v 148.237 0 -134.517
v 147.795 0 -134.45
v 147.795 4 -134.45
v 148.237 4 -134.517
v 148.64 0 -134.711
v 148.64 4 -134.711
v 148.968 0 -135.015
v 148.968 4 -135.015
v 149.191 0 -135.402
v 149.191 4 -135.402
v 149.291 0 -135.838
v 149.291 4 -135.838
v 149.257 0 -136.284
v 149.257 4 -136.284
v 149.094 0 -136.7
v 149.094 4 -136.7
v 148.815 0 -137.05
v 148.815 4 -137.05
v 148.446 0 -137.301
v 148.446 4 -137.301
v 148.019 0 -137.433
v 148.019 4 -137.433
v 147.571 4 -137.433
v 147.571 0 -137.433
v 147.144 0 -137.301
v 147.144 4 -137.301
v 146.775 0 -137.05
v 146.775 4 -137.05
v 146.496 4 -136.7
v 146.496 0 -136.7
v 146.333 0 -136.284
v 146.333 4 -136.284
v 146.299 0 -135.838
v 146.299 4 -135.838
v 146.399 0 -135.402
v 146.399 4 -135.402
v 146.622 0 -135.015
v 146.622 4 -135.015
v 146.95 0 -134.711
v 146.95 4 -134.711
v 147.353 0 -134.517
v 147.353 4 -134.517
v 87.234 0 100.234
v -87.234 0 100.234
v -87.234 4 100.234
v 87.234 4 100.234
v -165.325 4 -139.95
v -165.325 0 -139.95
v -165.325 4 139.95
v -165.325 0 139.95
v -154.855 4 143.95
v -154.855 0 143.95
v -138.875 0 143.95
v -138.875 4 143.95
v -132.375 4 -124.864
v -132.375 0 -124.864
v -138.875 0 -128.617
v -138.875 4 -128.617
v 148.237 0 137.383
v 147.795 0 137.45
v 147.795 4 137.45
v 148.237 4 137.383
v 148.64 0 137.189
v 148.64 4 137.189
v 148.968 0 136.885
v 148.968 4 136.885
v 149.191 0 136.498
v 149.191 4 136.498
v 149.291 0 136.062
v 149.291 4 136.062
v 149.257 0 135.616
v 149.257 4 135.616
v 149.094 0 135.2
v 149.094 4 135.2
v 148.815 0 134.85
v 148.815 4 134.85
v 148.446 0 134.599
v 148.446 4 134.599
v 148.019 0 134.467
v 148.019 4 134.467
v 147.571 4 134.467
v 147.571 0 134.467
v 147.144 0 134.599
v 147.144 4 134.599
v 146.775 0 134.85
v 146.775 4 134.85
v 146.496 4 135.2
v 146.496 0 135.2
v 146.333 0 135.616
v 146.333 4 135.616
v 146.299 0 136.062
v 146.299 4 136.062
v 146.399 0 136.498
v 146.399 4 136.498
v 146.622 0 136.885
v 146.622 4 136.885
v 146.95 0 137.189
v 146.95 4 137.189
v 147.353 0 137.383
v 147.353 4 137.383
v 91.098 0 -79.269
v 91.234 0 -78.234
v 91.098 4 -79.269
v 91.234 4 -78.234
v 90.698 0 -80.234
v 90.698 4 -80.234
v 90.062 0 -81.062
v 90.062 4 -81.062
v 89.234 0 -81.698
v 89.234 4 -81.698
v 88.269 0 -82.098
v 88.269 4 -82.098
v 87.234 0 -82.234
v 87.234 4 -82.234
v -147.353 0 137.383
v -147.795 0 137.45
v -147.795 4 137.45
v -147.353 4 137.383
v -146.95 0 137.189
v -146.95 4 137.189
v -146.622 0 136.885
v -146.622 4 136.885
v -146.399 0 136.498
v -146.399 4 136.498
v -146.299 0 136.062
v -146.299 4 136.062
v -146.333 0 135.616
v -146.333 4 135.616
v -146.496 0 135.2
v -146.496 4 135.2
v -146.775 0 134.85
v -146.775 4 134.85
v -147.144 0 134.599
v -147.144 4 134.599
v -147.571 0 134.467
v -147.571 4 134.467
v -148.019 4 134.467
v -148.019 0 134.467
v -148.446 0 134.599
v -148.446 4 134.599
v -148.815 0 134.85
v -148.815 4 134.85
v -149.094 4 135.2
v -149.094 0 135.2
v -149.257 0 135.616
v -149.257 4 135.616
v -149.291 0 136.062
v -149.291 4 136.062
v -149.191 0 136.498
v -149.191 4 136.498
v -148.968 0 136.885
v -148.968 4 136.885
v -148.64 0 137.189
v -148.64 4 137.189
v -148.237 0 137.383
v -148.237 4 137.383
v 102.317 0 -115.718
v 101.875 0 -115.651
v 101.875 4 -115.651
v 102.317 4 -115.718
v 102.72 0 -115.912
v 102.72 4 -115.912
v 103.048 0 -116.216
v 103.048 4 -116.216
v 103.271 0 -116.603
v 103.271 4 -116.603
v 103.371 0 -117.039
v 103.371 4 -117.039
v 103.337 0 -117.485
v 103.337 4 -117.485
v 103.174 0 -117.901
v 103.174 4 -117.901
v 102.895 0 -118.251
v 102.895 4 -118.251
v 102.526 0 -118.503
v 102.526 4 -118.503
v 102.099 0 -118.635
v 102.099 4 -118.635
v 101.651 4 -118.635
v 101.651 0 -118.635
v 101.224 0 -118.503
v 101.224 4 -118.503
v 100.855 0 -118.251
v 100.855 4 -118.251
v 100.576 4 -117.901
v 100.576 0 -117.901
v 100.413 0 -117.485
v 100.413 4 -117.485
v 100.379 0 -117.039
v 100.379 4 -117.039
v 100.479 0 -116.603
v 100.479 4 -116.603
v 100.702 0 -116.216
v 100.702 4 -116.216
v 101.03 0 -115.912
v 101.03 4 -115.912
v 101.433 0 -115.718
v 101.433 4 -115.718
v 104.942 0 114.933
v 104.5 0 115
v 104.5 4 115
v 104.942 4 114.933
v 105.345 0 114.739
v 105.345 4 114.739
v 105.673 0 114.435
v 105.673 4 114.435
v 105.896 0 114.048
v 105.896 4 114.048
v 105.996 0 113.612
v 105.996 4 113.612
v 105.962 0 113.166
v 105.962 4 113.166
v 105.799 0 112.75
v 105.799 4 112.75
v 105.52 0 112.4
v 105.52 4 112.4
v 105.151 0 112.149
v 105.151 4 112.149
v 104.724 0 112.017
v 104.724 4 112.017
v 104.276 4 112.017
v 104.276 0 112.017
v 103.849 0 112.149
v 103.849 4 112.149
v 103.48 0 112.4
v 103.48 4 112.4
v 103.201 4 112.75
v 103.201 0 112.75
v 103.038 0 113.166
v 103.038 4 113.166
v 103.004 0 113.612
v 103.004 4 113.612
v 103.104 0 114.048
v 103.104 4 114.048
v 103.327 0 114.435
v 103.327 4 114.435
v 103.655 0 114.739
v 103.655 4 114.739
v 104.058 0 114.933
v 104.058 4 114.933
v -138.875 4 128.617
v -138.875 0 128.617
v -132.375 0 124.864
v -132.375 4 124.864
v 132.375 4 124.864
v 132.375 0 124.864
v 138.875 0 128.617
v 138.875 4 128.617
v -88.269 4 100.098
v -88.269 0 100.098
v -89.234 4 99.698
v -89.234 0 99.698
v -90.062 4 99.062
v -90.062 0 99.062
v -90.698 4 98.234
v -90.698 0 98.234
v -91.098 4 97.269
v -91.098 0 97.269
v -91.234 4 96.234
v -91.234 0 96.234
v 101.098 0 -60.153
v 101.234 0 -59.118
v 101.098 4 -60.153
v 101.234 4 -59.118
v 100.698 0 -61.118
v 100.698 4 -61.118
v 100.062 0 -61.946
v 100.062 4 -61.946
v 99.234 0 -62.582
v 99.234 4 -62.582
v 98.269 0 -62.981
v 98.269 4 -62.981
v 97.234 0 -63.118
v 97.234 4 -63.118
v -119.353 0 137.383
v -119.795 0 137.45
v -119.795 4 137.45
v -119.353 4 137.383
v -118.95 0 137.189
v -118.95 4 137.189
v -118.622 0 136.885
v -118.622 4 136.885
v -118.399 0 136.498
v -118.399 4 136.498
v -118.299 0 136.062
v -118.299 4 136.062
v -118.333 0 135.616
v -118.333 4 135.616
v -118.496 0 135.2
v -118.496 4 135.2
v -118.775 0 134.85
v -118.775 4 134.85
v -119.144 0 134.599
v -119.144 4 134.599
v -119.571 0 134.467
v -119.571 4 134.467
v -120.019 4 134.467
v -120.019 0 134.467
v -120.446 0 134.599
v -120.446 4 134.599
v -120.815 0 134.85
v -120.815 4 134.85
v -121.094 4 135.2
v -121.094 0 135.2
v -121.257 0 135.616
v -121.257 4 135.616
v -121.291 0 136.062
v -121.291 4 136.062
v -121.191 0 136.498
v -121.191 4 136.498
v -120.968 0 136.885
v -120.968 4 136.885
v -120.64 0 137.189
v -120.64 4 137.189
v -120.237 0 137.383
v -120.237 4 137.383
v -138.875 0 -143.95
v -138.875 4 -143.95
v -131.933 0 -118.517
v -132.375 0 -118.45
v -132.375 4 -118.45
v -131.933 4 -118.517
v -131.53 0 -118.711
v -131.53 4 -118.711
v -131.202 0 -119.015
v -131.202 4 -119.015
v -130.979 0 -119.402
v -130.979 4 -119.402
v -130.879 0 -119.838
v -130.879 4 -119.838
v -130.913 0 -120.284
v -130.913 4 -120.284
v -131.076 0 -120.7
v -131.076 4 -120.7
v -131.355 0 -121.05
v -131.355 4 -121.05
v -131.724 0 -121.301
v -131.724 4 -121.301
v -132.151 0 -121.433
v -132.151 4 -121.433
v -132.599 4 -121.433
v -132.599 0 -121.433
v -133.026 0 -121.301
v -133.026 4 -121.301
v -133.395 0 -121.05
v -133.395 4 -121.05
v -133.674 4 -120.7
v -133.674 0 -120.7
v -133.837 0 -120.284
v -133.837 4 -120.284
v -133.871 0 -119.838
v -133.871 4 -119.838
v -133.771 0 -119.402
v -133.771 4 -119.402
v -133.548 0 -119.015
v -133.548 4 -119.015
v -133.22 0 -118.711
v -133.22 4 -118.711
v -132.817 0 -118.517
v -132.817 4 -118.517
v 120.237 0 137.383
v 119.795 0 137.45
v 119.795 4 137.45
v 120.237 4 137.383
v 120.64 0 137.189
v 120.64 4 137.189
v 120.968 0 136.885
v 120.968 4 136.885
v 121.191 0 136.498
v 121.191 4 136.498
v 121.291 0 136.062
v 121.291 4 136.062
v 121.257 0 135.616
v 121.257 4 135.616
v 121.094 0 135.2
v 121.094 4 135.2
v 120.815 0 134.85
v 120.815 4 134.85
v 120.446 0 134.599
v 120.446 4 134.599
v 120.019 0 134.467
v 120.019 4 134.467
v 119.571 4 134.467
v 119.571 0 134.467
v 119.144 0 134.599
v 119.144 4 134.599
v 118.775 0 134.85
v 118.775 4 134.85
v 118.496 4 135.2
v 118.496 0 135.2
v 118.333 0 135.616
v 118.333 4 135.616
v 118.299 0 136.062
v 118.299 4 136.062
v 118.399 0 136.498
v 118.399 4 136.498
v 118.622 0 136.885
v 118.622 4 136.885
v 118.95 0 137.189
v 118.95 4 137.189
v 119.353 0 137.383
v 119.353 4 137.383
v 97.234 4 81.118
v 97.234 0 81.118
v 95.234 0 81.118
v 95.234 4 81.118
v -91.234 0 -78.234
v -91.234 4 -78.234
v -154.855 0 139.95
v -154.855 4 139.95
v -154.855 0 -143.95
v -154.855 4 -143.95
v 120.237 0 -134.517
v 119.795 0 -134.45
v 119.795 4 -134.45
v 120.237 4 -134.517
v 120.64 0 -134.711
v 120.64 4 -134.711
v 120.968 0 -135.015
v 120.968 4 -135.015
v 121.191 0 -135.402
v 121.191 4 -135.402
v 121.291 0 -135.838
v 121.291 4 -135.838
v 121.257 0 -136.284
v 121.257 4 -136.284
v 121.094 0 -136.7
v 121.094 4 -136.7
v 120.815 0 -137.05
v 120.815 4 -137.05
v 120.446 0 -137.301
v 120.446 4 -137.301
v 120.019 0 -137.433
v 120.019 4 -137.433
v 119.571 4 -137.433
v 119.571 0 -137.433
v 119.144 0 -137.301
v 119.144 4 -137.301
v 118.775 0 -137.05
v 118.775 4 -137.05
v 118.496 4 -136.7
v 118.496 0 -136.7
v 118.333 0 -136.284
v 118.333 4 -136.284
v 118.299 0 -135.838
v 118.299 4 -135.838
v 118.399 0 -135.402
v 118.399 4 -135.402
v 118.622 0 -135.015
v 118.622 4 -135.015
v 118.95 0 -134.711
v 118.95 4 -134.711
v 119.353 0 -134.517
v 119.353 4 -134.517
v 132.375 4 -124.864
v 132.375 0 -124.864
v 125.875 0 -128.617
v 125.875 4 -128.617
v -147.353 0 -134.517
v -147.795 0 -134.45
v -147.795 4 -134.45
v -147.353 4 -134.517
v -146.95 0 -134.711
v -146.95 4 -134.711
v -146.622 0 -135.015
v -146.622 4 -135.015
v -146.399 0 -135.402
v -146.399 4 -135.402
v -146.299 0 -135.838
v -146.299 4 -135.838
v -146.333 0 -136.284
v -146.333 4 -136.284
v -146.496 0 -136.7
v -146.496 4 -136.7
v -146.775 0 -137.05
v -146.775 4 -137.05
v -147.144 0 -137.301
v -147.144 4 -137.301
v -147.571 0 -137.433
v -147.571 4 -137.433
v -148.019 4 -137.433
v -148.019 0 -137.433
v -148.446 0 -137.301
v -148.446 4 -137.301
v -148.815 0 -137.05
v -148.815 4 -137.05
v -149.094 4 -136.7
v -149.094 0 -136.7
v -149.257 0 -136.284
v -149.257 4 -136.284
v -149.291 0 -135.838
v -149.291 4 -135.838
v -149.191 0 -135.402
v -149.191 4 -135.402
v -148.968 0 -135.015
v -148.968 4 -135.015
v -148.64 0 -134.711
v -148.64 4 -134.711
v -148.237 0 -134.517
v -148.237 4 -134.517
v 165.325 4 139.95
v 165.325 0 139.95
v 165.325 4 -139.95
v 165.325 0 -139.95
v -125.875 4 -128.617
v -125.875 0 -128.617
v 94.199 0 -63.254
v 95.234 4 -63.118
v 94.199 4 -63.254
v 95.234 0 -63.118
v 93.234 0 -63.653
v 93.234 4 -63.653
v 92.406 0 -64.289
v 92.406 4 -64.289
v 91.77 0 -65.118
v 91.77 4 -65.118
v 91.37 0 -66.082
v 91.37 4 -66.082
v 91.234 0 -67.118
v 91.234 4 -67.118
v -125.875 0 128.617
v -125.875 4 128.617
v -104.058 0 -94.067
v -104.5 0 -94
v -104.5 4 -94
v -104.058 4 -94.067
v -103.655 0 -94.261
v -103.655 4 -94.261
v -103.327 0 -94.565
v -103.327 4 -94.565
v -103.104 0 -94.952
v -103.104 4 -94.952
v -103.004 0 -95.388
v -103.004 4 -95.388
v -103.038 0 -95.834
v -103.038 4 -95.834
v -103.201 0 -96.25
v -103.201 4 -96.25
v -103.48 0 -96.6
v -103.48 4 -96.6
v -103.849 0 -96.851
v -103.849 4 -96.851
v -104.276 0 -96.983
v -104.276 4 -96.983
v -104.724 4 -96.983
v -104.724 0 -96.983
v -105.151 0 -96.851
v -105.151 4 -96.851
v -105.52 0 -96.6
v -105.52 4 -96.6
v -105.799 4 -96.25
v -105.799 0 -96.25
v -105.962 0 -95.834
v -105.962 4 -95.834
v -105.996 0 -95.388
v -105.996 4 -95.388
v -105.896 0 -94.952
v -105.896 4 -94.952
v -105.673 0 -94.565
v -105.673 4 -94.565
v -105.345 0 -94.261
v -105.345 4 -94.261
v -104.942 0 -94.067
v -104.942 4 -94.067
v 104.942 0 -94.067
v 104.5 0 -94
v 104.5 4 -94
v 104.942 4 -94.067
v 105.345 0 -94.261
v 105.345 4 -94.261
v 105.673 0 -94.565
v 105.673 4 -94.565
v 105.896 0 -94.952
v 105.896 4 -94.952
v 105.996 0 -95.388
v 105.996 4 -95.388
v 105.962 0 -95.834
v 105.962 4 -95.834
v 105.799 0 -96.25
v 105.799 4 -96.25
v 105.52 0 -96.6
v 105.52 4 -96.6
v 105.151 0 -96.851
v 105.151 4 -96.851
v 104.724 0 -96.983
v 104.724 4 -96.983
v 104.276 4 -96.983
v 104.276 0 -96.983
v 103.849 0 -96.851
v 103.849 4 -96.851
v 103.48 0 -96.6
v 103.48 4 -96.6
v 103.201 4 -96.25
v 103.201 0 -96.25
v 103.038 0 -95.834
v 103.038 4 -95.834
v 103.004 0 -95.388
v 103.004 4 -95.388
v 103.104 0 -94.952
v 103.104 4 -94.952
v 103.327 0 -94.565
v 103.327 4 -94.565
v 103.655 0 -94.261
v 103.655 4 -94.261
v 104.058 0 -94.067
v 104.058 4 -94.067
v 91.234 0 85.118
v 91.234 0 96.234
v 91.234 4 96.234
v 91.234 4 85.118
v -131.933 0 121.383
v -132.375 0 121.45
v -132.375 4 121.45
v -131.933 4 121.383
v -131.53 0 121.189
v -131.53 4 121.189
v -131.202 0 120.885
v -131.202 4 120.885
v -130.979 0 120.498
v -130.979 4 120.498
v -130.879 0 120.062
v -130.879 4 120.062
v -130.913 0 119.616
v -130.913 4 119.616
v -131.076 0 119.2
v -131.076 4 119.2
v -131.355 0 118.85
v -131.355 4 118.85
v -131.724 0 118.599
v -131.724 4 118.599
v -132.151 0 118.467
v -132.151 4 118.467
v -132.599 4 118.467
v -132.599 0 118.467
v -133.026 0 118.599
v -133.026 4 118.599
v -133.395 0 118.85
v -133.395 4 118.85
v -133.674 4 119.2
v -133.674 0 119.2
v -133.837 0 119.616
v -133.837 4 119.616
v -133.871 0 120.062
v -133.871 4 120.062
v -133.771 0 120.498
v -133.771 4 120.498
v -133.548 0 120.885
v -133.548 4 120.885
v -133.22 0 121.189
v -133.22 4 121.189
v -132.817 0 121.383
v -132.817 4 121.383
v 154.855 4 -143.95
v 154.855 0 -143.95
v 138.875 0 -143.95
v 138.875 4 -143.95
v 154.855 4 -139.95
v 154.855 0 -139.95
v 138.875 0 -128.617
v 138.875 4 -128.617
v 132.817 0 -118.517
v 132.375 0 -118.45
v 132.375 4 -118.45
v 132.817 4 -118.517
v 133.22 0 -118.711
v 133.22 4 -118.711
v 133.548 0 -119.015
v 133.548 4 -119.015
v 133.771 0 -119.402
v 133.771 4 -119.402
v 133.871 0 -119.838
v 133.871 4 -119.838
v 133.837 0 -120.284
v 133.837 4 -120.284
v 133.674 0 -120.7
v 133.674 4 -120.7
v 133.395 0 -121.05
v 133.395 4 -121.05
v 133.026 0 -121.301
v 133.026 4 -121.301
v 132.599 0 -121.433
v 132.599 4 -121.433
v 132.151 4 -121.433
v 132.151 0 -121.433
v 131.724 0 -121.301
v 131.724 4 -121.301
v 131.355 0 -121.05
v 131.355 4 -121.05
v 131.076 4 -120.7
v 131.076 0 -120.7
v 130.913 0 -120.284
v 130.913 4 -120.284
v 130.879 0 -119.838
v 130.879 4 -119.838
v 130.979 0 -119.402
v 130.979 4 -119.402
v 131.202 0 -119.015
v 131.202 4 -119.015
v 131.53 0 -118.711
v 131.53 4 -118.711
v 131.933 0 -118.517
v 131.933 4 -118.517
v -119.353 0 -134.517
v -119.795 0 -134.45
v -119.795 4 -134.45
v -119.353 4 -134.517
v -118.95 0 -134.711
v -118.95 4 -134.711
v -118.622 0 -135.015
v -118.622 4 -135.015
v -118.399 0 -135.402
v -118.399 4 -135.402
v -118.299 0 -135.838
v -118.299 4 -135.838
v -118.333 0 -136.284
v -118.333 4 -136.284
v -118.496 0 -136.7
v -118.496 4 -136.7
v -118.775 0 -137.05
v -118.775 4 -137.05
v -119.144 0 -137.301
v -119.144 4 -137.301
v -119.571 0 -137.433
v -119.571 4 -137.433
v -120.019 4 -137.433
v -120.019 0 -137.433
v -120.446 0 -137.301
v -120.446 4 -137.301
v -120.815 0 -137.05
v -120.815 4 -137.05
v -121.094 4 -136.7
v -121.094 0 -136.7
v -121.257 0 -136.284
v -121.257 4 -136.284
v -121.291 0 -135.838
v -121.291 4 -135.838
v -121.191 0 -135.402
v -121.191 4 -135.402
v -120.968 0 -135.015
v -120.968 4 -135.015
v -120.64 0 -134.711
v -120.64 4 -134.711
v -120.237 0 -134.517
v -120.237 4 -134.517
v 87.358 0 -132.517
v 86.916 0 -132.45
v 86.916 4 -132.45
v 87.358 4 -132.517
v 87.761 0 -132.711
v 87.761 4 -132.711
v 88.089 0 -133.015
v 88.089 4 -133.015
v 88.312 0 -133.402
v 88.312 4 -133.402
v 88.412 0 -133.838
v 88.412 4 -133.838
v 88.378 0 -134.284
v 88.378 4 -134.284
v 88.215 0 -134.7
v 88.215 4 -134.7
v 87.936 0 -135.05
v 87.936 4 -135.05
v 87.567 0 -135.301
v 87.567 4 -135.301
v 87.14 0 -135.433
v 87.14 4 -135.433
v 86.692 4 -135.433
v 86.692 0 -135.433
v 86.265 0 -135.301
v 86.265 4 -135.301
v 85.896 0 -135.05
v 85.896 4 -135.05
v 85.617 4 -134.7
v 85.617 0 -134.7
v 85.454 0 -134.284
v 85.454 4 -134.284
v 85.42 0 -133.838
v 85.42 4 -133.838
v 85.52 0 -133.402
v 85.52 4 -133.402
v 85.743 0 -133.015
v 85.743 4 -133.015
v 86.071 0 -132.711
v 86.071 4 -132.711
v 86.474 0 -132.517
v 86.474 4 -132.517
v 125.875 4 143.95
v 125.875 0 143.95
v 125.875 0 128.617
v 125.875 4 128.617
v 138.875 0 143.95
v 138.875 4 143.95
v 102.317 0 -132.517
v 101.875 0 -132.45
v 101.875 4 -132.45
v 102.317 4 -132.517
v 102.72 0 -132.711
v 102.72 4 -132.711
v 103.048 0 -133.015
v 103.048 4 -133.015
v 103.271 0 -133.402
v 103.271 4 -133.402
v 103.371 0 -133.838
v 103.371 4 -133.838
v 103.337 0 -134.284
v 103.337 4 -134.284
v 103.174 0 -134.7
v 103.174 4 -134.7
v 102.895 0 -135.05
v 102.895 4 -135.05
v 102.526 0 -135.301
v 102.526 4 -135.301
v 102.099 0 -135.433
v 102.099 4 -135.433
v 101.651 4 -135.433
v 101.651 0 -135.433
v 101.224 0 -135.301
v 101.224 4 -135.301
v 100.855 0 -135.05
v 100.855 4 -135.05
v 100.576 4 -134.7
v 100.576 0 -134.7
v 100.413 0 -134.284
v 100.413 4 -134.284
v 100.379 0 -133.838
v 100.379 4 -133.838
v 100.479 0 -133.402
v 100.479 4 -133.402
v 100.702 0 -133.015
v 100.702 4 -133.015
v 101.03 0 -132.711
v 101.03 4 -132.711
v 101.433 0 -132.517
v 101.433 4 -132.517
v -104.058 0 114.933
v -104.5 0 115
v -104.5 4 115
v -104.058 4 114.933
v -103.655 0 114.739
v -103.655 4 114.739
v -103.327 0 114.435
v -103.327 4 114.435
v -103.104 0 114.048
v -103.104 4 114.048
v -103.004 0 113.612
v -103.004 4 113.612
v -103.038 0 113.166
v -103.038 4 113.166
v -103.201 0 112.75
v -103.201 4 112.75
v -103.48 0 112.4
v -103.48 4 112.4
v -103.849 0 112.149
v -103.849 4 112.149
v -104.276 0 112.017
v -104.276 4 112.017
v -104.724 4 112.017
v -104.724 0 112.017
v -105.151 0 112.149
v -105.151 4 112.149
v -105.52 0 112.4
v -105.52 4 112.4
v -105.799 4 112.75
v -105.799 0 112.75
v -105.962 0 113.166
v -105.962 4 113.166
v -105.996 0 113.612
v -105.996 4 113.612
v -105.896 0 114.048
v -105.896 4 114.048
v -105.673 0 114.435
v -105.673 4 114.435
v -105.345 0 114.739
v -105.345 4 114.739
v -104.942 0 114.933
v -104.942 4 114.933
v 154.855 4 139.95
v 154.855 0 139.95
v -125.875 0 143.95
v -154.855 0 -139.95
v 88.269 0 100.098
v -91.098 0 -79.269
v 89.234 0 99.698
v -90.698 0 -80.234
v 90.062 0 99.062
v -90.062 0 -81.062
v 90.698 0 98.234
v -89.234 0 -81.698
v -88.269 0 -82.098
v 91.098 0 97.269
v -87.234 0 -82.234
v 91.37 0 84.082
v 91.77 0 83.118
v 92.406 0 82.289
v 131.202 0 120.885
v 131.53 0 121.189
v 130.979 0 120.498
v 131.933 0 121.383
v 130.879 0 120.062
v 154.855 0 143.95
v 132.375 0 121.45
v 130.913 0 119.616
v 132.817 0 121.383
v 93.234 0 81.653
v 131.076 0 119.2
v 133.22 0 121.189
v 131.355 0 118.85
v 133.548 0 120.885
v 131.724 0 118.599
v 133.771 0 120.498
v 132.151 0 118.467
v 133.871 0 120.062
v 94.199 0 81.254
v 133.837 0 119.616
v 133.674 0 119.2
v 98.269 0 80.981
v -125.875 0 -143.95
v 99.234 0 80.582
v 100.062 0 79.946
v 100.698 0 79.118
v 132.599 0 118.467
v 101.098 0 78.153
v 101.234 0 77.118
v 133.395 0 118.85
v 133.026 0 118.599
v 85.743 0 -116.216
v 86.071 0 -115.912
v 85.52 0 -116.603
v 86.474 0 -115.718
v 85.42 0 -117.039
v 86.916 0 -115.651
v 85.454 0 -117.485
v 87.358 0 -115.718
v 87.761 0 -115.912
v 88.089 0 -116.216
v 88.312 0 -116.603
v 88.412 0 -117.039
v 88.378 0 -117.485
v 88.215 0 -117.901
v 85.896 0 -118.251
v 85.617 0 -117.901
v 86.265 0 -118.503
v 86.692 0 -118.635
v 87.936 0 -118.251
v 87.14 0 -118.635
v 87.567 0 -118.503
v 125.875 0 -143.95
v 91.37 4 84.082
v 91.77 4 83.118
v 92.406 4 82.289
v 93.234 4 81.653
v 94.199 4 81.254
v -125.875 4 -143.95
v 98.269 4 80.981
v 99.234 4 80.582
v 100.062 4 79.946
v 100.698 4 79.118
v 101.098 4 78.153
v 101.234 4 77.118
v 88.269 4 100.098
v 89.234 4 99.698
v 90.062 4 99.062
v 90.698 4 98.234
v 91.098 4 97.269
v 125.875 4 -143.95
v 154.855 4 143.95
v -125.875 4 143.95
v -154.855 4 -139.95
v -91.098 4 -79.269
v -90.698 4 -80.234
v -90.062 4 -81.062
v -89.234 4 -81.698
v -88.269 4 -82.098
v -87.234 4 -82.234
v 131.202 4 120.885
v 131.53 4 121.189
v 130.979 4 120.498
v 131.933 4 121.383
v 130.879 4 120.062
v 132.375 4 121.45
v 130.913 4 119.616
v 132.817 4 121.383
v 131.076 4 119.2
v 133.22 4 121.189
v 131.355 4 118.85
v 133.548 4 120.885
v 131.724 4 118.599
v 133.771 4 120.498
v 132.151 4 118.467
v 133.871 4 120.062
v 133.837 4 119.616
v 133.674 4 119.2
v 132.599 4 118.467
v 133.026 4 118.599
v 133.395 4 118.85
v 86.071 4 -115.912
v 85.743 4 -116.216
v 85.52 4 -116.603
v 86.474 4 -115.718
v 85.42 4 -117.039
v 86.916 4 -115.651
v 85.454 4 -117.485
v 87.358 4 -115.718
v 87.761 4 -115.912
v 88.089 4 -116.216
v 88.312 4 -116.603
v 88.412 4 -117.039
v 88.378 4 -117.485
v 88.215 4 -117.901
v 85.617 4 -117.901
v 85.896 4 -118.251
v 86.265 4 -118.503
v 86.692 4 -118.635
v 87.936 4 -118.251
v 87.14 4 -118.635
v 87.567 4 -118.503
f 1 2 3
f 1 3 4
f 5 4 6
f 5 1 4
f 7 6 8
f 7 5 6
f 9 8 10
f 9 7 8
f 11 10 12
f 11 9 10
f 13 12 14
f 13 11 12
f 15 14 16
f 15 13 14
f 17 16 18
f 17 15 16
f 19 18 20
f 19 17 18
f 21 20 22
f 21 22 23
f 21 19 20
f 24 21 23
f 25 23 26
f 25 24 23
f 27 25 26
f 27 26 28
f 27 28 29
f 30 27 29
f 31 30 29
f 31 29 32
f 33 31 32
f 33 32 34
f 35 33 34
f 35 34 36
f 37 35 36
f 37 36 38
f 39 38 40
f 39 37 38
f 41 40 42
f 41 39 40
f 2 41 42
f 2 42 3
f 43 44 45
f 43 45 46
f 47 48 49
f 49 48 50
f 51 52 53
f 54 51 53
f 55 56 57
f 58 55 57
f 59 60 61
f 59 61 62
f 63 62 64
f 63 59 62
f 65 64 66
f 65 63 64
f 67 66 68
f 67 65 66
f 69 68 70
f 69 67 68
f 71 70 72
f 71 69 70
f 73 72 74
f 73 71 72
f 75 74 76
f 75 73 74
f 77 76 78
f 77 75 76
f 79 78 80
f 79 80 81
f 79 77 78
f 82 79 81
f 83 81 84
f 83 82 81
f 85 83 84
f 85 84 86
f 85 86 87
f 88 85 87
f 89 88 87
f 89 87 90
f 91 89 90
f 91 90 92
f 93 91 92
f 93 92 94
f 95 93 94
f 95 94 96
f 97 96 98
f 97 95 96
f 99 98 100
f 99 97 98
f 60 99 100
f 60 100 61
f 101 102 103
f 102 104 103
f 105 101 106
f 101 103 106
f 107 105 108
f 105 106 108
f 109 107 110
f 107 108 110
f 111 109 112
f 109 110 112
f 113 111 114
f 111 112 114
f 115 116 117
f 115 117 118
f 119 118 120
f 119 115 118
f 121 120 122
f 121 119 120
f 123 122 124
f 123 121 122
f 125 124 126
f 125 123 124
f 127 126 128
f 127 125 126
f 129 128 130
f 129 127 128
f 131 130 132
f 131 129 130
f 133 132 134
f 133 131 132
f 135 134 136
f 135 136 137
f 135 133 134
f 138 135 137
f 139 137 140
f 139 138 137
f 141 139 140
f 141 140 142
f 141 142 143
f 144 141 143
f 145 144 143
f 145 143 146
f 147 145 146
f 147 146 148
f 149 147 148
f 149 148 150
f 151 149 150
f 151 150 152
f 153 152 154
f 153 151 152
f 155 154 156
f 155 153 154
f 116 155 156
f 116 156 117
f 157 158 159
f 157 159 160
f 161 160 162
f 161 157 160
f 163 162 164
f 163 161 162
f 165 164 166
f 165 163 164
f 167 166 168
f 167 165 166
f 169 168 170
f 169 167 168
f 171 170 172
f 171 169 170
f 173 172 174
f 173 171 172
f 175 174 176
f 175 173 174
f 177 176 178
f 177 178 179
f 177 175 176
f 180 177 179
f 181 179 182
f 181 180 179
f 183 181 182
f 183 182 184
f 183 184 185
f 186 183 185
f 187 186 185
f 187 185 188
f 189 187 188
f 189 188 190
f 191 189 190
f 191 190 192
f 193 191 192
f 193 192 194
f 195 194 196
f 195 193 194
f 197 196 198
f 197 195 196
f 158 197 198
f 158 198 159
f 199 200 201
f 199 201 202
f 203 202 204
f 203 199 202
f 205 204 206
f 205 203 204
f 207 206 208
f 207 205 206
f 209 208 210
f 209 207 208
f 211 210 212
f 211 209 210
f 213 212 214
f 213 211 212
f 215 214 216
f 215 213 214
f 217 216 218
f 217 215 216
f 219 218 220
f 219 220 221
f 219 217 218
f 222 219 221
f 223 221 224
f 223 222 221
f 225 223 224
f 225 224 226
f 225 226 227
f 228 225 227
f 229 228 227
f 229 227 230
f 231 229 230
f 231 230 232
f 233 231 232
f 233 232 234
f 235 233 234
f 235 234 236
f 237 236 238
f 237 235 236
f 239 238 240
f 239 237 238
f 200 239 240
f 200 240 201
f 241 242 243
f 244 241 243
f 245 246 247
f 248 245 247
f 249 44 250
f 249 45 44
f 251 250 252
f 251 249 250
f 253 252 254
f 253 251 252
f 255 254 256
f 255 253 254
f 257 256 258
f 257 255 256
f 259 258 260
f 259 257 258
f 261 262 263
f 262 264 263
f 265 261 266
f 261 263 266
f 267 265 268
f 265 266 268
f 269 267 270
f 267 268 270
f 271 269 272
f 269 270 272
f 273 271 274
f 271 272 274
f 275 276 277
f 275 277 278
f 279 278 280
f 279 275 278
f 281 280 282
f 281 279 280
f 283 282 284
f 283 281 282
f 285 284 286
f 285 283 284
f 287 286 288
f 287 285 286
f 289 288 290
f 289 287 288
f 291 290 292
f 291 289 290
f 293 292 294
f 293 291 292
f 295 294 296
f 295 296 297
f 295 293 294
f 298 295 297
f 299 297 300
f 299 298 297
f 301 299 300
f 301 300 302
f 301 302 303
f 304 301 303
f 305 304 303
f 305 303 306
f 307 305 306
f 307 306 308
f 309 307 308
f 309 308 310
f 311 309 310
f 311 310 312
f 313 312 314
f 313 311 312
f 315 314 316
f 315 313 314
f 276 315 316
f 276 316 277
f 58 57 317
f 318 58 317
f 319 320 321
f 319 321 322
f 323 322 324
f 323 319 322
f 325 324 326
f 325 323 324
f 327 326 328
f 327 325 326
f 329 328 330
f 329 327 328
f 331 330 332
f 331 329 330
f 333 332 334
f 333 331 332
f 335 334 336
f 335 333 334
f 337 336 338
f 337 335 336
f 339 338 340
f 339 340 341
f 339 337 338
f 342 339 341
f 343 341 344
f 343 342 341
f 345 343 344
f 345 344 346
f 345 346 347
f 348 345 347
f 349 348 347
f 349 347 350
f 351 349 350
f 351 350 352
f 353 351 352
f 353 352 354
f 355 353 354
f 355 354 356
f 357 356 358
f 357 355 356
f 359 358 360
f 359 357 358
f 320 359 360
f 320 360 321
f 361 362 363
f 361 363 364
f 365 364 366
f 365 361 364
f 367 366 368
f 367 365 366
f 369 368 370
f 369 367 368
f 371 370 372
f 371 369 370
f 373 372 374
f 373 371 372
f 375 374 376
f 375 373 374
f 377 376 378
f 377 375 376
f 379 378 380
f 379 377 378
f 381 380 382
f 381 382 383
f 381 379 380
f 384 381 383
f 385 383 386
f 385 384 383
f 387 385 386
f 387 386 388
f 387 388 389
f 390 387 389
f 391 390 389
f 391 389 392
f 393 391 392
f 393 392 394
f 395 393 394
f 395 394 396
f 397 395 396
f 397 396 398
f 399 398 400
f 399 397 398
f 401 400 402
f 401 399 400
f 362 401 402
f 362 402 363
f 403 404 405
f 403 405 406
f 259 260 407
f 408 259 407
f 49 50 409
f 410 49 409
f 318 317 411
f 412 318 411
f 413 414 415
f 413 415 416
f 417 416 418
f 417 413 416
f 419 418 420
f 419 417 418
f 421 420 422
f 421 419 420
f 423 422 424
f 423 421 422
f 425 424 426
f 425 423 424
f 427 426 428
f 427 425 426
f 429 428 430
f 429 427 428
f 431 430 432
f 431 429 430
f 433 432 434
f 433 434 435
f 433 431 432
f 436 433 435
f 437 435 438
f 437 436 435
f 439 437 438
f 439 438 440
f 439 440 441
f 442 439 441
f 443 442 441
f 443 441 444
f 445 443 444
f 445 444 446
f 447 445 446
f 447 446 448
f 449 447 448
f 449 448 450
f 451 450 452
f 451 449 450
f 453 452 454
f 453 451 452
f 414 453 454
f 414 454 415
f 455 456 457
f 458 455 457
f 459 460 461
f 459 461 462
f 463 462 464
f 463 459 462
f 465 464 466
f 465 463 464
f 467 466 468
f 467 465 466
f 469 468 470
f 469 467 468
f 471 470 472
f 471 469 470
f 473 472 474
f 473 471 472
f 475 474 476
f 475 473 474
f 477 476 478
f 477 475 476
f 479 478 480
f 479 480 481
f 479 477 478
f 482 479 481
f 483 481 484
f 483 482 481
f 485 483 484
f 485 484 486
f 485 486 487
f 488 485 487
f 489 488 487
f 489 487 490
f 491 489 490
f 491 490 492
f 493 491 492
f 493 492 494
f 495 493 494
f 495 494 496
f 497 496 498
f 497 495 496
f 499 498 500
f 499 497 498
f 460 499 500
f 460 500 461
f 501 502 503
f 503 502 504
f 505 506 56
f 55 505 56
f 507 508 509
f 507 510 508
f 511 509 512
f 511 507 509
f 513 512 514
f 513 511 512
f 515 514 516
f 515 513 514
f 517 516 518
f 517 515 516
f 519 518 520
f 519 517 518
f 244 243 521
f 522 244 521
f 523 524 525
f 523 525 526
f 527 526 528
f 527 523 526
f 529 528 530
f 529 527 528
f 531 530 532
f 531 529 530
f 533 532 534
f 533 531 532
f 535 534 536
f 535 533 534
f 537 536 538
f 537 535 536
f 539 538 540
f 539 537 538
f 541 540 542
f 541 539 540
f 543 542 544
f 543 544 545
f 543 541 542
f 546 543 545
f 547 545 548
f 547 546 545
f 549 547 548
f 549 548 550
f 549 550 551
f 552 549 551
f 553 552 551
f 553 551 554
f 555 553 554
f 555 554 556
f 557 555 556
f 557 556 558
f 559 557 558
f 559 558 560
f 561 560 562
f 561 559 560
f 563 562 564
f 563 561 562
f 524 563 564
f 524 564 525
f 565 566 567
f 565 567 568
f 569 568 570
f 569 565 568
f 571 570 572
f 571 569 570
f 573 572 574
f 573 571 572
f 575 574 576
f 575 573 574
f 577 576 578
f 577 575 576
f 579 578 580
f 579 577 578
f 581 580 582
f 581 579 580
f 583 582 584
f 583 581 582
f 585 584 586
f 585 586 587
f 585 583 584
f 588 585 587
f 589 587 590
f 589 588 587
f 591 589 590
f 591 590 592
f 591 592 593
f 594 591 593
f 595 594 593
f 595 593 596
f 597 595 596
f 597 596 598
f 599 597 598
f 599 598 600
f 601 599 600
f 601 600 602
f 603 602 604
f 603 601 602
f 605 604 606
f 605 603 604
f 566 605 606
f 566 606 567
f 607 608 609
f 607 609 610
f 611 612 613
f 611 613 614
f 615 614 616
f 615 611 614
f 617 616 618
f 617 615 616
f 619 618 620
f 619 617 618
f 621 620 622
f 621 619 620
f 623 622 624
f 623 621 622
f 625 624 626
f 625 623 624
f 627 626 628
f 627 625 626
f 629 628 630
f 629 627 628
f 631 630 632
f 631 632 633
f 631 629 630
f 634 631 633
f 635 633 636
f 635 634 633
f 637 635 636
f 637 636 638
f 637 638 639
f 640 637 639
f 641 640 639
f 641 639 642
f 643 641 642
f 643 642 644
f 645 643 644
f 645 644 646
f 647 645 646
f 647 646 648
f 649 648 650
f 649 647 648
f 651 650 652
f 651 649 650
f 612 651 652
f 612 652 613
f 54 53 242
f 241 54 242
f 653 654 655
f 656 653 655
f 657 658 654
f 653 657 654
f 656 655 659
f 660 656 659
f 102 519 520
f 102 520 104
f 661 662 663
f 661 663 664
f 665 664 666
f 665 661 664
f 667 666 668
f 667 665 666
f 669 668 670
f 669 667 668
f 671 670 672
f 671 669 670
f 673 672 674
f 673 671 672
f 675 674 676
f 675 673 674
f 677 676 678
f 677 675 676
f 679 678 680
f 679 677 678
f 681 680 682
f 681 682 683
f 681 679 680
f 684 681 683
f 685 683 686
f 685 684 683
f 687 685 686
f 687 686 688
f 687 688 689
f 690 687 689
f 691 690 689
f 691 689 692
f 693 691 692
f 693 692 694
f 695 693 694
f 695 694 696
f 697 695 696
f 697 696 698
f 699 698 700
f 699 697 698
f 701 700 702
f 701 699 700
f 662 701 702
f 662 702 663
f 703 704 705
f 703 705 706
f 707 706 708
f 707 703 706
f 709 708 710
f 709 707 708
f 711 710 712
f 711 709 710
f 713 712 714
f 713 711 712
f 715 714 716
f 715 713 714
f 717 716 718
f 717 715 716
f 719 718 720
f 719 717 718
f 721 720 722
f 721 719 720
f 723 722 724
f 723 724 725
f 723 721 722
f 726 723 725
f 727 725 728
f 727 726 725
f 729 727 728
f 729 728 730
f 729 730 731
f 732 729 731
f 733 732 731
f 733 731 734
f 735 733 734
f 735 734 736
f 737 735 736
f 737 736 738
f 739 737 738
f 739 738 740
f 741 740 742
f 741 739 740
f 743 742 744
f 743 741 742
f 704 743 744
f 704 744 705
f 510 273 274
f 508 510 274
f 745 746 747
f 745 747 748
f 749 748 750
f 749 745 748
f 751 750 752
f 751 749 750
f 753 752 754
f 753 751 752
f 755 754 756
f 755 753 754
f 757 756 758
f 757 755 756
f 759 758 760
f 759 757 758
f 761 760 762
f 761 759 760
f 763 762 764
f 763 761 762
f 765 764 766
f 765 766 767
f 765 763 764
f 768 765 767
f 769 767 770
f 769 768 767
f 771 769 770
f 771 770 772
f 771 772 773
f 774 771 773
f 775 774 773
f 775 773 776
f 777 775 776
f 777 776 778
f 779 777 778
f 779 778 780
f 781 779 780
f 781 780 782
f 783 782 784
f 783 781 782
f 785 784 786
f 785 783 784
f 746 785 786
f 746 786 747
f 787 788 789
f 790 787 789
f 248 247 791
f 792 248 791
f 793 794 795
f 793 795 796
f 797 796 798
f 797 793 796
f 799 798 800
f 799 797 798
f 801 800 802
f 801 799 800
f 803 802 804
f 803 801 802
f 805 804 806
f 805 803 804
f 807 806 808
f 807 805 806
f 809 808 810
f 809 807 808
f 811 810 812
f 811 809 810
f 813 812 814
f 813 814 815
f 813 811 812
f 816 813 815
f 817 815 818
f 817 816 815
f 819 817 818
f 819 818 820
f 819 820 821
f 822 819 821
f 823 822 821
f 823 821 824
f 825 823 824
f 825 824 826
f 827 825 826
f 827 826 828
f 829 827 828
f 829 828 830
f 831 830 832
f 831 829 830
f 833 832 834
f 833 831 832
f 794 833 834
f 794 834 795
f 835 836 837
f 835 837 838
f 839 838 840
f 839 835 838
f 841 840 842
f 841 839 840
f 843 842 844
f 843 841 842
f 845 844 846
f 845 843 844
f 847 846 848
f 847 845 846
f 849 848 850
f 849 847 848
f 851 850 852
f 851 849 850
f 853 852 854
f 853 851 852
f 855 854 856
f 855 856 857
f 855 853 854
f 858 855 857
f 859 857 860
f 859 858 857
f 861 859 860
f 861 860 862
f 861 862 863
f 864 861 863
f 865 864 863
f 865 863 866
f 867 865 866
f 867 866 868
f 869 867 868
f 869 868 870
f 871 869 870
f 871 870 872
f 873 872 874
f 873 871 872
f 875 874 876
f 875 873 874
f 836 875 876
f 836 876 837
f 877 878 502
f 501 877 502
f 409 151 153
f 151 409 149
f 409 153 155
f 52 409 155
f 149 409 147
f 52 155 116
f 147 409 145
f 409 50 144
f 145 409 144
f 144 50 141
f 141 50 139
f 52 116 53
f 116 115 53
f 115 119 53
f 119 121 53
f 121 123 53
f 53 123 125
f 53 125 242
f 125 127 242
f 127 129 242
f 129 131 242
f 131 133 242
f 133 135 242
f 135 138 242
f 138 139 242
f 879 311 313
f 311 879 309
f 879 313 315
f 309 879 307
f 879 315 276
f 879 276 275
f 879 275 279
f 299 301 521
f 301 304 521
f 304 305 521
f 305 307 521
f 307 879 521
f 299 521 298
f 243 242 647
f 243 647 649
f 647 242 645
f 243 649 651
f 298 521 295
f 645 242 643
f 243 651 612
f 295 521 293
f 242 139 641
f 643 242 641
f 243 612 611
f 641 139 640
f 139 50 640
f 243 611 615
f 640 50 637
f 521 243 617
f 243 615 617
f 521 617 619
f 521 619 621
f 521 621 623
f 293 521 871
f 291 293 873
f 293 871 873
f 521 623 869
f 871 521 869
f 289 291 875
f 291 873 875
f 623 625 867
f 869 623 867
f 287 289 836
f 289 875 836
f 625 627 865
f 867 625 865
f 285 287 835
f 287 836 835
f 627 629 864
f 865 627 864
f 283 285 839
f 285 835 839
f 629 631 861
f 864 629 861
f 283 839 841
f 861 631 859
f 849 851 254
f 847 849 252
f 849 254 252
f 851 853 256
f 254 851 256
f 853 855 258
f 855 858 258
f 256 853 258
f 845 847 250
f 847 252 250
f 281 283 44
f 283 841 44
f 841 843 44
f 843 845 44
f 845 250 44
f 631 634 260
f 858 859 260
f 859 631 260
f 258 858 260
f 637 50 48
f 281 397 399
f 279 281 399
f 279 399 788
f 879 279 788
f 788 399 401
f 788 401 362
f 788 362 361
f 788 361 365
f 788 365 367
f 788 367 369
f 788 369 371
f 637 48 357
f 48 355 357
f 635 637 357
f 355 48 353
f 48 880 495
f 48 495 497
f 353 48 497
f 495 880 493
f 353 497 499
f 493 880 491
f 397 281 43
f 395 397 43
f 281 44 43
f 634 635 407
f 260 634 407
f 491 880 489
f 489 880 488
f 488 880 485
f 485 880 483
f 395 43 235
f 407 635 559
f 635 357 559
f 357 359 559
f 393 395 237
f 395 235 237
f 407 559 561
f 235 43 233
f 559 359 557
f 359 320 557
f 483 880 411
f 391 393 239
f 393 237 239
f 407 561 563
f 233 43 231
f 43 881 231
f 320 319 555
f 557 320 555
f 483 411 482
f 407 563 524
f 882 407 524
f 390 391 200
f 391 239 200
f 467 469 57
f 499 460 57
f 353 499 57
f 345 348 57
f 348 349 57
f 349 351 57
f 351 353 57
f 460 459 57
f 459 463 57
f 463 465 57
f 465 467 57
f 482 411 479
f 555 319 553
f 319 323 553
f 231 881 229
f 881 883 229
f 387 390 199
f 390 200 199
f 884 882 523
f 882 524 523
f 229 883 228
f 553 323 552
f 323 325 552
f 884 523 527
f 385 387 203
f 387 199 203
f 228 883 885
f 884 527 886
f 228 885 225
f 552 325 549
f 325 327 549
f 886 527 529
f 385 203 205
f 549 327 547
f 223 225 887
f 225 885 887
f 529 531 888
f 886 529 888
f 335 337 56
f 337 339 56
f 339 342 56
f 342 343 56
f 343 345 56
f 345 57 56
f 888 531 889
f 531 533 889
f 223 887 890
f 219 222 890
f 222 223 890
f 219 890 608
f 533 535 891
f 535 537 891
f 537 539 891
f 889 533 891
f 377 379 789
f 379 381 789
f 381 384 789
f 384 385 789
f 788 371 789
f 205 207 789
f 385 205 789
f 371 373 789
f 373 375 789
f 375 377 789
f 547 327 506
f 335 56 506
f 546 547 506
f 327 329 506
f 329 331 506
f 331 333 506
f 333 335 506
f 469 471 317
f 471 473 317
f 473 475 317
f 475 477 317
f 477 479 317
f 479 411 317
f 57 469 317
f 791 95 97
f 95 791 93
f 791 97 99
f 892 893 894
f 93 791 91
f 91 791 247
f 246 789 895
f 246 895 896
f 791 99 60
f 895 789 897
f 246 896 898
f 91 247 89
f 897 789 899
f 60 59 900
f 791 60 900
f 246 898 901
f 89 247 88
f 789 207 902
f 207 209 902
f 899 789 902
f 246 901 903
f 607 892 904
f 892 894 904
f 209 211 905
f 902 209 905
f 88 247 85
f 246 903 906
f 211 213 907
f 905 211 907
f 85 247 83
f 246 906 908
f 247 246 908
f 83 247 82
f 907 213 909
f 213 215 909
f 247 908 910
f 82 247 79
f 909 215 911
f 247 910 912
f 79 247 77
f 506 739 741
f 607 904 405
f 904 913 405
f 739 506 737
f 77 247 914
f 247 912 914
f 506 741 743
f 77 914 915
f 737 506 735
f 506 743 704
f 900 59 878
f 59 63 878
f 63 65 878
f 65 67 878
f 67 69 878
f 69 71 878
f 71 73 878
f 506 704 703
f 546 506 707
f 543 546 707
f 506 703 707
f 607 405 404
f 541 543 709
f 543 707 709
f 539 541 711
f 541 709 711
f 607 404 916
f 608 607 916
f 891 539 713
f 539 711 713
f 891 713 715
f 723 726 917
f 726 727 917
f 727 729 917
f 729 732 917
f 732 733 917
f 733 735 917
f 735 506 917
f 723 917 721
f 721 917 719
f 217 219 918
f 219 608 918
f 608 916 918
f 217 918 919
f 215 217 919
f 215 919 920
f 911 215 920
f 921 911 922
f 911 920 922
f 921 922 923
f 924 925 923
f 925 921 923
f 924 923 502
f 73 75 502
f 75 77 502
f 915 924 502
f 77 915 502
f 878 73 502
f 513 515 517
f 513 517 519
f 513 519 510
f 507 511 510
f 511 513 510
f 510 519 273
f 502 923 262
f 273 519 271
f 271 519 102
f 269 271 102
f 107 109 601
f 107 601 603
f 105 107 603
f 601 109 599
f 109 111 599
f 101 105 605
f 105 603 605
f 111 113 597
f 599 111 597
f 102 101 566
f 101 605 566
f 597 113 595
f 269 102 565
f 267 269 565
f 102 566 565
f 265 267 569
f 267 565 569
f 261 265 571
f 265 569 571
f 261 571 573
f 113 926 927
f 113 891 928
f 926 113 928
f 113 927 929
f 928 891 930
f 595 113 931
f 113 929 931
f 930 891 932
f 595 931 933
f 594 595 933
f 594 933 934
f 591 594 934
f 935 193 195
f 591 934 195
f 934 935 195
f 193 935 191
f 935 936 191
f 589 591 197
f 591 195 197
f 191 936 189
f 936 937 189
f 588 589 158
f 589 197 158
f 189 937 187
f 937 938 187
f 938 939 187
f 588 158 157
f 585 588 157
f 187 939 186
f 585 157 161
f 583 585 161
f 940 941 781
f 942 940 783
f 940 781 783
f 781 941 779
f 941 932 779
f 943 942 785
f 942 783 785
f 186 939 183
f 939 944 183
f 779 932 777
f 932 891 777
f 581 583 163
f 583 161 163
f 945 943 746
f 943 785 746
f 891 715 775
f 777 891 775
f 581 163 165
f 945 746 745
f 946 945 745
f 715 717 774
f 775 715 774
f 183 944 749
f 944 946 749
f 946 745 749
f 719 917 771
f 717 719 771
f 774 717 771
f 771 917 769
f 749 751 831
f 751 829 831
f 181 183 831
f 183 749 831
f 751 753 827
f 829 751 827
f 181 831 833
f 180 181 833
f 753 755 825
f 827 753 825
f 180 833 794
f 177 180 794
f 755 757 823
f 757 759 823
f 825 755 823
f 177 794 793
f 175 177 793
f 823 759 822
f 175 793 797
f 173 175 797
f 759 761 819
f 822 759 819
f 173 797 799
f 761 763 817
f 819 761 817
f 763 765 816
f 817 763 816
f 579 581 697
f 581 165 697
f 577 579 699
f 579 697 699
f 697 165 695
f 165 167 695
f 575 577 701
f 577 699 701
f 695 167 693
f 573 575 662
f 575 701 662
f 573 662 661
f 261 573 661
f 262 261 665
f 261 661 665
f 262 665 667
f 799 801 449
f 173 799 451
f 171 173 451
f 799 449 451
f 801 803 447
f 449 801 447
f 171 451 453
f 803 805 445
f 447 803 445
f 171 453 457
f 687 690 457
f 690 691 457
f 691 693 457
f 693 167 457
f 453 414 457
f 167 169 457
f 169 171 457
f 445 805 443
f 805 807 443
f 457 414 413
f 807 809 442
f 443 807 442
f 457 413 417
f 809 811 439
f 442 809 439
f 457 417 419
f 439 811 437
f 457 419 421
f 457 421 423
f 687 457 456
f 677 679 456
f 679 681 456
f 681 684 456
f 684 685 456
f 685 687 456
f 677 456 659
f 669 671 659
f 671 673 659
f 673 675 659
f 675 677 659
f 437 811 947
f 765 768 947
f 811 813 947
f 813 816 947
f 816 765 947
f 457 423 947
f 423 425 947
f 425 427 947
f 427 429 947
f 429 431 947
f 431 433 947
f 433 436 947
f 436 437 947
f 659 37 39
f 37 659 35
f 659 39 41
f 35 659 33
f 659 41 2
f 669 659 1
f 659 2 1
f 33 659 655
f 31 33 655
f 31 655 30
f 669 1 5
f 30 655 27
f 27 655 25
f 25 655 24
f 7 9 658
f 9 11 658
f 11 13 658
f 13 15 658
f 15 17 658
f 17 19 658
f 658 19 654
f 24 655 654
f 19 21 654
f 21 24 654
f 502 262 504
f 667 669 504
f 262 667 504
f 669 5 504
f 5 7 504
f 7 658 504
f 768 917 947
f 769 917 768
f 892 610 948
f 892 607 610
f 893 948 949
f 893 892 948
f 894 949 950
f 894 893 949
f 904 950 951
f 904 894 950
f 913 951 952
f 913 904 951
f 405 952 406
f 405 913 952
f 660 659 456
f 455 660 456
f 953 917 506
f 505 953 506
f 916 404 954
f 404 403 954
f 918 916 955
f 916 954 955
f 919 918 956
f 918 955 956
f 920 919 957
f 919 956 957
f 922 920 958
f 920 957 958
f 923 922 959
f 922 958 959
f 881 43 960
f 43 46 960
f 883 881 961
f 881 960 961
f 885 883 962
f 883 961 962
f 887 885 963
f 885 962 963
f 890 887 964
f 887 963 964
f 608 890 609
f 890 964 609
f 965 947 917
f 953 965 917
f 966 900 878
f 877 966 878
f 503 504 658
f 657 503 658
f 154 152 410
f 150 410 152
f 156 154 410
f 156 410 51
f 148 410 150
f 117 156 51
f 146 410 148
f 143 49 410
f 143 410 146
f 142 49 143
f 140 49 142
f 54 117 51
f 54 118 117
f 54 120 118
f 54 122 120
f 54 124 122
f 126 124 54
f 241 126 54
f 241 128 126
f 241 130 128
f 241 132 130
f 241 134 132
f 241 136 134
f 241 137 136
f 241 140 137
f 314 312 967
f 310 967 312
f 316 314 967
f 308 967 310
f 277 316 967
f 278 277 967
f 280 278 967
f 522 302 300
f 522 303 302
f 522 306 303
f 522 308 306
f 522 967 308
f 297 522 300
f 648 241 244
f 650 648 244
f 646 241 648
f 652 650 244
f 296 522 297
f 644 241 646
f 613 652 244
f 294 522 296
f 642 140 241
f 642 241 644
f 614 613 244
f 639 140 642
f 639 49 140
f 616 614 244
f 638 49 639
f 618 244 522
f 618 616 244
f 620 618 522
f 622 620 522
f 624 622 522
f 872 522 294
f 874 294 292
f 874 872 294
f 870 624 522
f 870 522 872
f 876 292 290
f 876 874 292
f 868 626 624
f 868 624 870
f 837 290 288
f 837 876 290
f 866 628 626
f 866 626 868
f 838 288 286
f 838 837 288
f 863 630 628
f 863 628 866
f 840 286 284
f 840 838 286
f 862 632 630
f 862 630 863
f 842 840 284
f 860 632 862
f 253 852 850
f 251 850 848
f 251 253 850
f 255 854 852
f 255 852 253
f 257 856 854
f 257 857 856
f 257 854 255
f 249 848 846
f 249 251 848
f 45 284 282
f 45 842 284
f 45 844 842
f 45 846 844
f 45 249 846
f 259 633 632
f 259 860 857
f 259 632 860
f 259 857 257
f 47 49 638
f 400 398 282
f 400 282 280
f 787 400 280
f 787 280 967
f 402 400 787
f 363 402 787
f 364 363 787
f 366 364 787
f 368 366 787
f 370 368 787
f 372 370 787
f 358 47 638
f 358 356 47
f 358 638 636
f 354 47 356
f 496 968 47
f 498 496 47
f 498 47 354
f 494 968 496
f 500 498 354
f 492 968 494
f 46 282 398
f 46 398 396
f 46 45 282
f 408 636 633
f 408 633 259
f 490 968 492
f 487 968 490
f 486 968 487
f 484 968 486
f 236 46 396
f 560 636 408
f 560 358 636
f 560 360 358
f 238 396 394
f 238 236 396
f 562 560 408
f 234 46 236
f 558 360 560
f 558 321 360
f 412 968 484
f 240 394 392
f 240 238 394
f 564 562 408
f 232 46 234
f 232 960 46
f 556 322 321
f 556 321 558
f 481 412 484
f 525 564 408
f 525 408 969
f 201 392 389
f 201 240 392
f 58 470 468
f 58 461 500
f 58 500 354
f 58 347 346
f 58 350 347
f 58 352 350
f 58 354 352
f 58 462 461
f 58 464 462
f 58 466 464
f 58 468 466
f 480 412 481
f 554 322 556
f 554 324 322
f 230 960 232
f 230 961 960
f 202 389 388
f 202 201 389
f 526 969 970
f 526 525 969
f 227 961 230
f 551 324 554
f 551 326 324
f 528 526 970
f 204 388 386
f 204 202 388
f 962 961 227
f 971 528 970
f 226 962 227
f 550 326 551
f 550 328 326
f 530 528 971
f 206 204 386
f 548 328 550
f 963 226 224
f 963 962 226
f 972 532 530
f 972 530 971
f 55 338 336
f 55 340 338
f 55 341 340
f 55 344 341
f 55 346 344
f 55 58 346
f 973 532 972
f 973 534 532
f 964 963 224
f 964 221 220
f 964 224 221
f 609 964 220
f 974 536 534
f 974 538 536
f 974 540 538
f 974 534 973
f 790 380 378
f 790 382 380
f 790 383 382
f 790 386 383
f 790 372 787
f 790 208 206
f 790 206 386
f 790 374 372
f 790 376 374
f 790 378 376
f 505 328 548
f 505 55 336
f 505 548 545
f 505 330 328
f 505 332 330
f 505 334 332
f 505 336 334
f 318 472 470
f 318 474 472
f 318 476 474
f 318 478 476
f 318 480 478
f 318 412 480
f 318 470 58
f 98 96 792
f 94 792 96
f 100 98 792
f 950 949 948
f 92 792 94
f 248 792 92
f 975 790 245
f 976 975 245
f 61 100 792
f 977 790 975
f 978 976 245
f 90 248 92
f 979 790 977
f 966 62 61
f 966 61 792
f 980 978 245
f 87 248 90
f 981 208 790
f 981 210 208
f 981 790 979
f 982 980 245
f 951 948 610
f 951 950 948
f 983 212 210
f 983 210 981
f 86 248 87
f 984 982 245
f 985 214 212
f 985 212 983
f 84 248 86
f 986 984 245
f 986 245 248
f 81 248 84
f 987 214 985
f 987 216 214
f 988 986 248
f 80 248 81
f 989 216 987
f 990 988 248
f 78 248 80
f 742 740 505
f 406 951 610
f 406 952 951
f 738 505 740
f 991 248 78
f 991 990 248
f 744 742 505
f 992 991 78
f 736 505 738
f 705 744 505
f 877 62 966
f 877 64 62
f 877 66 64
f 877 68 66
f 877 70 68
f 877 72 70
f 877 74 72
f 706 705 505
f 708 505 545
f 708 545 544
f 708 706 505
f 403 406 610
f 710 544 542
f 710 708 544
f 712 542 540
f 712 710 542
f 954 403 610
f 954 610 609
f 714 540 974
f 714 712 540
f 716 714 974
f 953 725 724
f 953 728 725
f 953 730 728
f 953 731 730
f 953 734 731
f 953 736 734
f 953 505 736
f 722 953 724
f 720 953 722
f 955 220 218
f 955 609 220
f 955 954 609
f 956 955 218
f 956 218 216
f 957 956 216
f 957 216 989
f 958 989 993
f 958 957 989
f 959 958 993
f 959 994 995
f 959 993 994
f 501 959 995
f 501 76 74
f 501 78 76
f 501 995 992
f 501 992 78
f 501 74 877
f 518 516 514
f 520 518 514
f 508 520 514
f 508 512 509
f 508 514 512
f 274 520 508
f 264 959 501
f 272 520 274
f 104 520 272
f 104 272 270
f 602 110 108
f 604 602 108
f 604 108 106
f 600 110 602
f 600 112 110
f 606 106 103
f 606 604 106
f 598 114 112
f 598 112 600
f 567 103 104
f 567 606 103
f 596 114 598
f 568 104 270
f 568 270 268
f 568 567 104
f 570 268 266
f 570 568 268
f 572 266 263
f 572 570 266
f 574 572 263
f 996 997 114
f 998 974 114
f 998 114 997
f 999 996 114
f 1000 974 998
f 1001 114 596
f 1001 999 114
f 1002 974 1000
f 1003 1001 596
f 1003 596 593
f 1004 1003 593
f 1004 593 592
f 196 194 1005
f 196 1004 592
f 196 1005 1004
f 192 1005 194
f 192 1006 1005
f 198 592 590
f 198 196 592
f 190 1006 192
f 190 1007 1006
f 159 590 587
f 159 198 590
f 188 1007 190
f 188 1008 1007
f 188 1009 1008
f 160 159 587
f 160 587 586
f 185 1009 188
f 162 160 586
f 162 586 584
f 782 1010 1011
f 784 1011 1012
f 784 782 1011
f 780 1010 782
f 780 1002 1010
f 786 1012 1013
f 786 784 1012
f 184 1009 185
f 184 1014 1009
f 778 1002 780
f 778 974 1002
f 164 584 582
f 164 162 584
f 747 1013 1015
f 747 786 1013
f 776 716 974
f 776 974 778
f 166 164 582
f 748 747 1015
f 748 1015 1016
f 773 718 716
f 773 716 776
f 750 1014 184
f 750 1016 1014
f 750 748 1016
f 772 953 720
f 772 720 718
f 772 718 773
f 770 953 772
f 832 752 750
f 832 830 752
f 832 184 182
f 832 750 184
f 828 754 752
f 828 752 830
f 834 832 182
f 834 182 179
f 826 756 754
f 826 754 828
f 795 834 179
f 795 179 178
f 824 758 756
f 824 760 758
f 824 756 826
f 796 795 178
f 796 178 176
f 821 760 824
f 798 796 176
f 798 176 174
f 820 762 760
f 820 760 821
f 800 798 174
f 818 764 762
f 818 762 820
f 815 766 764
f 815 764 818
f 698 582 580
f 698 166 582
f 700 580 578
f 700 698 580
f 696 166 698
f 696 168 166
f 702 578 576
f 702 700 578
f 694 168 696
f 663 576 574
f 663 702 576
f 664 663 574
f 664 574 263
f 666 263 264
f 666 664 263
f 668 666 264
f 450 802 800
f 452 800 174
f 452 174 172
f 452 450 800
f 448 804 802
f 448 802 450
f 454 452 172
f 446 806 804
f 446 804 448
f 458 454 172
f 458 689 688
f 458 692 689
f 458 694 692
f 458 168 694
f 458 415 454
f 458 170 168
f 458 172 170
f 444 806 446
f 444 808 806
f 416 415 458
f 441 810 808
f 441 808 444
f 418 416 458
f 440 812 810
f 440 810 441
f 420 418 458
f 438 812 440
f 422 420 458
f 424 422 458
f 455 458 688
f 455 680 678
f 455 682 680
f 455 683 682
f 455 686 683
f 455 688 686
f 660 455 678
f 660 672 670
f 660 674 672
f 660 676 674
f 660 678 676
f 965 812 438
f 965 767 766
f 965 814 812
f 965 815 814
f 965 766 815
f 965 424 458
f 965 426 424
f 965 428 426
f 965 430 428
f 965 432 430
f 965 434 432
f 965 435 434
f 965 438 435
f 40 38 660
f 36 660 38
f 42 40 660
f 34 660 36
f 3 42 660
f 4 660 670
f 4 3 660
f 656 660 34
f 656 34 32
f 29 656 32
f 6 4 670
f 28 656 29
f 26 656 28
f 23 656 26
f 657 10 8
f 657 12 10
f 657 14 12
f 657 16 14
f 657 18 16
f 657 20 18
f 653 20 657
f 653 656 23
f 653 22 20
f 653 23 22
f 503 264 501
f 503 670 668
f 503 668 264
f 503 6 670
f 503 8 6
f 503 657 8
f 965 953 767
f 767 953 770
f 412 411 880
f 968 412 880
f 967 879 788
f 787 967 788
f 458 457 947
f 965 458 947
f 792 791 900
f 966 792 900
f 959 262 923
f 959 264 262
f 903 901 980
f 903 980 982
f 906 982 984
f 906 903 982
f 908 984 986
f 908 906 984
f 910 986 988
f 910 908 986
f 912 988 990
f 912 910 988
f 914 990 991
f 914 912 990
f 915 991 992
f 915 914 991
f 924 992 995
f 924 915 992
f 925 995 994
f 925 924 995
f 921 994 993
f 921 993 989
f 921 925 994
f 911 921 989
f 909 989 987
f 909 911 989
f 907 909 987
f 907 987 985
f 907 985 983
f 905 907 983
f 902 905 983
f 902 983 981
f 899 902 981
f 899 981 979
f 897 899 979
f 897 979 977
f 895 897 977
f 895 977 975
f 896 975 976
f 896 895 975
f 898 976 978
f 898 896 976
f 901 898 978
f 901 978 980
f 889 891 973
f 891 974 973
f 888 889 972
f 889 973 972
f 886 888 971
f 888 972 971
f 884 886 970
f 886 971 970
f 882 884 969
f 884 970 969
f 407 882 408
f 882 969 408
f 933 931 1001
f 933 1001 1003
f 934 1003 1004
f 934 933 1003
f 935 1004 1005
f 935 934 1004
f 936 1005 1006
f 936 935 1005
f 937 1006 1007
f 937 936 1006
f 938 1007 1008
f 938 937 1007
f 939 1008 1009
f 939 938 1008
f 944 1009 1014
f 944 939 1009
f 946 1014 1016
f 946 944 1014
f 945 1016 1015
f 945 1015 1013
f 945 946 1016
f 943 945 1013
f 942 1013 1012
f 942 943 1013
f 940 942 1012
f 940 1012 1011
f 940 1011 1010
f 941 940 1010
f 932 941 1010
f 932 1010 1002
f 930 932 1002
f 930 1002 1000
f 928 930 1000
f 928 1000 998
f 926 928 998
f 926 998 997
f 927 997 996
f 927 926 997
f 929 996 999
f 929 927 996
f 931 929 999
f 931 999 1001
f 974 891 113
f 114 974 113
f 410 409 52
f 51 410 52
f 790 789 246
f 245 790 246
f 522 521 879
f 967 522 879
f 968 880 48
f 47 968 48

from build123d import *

# Parameters (mm, degrees)
SKETCH1_R               = 1.5
SKETCH1_W               = 182.468094358
SKETCH1_H               = 182.468094358
BOSS_EXTRUDE1_DEPTH     = 4
CUT_EXTRUDE1_DEPTH      = 10
CUT_EXTRUDE1_DEPTH_BACK = 10
SKETCH7_W               = 144.235193926
SKETCH7_H               = 4
FILLET1_R               = 4


with BuildPart() as part:
    # Sketch1 → Boss-Extrude1 (new body)
    with BuildSketch(Plane(origin=(0, 0, 0), x_dir=(1, 0, 0), z_dir=(0, 1, 0))):
        Polygon((154.855, -139.95), (165.325, -139.95), (165.325, 139.95), (154.855, 139.95), (154.855, 143.95), (138.875, 143.95), (138.875, 128.61722325), (132.375, 124.864446501), (125.875, 128.61722325), (125.875, 143.95), (-125.875, 143.95), (-125.875, 128.61722325), (-132.375, 124.864446501), (-138.875, 128.61722325), (-138.875, 143.95), (-154.855, 143.95), (-154.855, 139.95), (-165.325, 139.95), (-165.325, -139.95), (-154.855, -139.95), (-154.855, -143.95), (-138.875, -143.95), (-138.875, -128.61722325), (-132.375, -124.864446501), (-125.875, -128.61722325), (-125.875, -143.95), (125.875, -143.95), (125.875, -128.61722325), (132.375, -124.864446501), (138.875, -128.61722325), (138.875, -143.95), (154.855, -143.95), align=None)
        with Locations((-147.795, -135.95)):
            Circle(SKETCH1_R, mode=Mode.SUBTRACT)
        with Locations((-132.375, -119.95)):
            Circle(SKETCH1_R, mode=Mode.SUBTRACT)
        with Locations((-119.795, -135.95)):
            Circle(SKETCH1_R, mode=Mode.SUBTRACT)
        with Locations((-104.5, -113.5)):
            Circle(SKETCH1_R, mode=Mode.SUBTRACT)
        with Locations((0, -9)):
            Rectangle(SKETCH1_W, SKETCH1_H, mode=Mode.SUBTRACT)
        with Locations((119.795, -135.95)):
            Circle(SKETCH1_R, mode=Mode.SUBTRACT)
        with Locations((104.5, -113.5)):
            Circle(SKETCH1_R, mode=Mode.SUBTRACT)
        with Locations((147.795, -135.95)):
            Circle(SKETCH1_R, mode=Mode.SUBTRACT)
        with Locations((132.375, -119.95)):
            Circle(SKETCH1_R, mode=Mode.SUBTRACT)
        with Locations((-104.5, 95.5)):
            Circle(SKETCH1_R, mode=Mode.SUBTRACT)
        with Locations((-132.375, 119.95)):
            Circle(SKETCH1_R, mode=Mode.SUBTRACT)
        with Locations((-147.795, 135.95)):
            Circle(SKETCH1_R, mode=Mode.SUBTRACT)
        with Locations((-119.795, 135.95)):
            Circle(SKETCH1_R, mode=Mode.SUBTRACT)
        with Locations((104.5, 95.5)):
            Circle(SKETCH1_R, mode=Mode.SUBTRACT)
        with Locations((86.915968312, 117.1513625)):
            Circle(SKETCH1_R, mode=Mode.SUBTRACT)
        with Locations((101.875, 117.1513625)):
            Circle(SKETCH1_R, mode=Mode.SUBTRACT)
        with Locations((86.915968312, 133.95)):
            Circle(SKETCH1_R, mode=Mode.SUBTRACT)
        with Locations((101.875, 133.95)):
            Circle(SKETCH1_R, mode=Mode.SUBTRACT)
        with Locations((119.795, 135.95)):
            Circle(SKETCH1_R, mode=Mode.SUBTRACT)
        with Locations((132.375, 119.95)):
            Circle(SKETCH1_R, mode=Mode.SUBTRACT)
        with Locations((147.795, 135.95)):
            Circle(SKETCH1_R, mode=Mode.SUBTRACT)
    extrude(amount=BOSS_EXTRUDE1_DEPTH)

    # Sketch7 → Cut-Extrude1 (cut, two sides: drawn at the far end of the back side and taken through both)
    with BuildSketch(Plane.ZY.offset(-91.234047179).offset(-CUT_EXTRUDE1_DEPTH_BACK)):
        with Locations((9, 2)):
            Rectangle(SKETCH7_W, SKETCH7_H)
    extrude(amount=CUT_EXTRUDE1_DEPTH + CUT_EXTRUDE1_DEPTH_BACK, mode=Mode.SUBTRACT)

    # Fillet1
    fillet1_edges = [part.edges().sort_by_distance(p)[0] for p in [
        (101.234047179, 2, -63.117596963),
        (101.234047179, 2, 81.117596963),
        (91.234047179, 2, 100.234047179),
        (-91.234047179, 2, 100.234047179),
        (-91.234047179, 2, -82.234047179),
        (91.234047179, 2, -82.234047179),
        (91.234047179, 2, -63.117596963),
        (91.234047179, 2, 81.117596963),
    ]]
    fillet(fillet1_edges, radius=FILLET1_R)


solid = part.part
